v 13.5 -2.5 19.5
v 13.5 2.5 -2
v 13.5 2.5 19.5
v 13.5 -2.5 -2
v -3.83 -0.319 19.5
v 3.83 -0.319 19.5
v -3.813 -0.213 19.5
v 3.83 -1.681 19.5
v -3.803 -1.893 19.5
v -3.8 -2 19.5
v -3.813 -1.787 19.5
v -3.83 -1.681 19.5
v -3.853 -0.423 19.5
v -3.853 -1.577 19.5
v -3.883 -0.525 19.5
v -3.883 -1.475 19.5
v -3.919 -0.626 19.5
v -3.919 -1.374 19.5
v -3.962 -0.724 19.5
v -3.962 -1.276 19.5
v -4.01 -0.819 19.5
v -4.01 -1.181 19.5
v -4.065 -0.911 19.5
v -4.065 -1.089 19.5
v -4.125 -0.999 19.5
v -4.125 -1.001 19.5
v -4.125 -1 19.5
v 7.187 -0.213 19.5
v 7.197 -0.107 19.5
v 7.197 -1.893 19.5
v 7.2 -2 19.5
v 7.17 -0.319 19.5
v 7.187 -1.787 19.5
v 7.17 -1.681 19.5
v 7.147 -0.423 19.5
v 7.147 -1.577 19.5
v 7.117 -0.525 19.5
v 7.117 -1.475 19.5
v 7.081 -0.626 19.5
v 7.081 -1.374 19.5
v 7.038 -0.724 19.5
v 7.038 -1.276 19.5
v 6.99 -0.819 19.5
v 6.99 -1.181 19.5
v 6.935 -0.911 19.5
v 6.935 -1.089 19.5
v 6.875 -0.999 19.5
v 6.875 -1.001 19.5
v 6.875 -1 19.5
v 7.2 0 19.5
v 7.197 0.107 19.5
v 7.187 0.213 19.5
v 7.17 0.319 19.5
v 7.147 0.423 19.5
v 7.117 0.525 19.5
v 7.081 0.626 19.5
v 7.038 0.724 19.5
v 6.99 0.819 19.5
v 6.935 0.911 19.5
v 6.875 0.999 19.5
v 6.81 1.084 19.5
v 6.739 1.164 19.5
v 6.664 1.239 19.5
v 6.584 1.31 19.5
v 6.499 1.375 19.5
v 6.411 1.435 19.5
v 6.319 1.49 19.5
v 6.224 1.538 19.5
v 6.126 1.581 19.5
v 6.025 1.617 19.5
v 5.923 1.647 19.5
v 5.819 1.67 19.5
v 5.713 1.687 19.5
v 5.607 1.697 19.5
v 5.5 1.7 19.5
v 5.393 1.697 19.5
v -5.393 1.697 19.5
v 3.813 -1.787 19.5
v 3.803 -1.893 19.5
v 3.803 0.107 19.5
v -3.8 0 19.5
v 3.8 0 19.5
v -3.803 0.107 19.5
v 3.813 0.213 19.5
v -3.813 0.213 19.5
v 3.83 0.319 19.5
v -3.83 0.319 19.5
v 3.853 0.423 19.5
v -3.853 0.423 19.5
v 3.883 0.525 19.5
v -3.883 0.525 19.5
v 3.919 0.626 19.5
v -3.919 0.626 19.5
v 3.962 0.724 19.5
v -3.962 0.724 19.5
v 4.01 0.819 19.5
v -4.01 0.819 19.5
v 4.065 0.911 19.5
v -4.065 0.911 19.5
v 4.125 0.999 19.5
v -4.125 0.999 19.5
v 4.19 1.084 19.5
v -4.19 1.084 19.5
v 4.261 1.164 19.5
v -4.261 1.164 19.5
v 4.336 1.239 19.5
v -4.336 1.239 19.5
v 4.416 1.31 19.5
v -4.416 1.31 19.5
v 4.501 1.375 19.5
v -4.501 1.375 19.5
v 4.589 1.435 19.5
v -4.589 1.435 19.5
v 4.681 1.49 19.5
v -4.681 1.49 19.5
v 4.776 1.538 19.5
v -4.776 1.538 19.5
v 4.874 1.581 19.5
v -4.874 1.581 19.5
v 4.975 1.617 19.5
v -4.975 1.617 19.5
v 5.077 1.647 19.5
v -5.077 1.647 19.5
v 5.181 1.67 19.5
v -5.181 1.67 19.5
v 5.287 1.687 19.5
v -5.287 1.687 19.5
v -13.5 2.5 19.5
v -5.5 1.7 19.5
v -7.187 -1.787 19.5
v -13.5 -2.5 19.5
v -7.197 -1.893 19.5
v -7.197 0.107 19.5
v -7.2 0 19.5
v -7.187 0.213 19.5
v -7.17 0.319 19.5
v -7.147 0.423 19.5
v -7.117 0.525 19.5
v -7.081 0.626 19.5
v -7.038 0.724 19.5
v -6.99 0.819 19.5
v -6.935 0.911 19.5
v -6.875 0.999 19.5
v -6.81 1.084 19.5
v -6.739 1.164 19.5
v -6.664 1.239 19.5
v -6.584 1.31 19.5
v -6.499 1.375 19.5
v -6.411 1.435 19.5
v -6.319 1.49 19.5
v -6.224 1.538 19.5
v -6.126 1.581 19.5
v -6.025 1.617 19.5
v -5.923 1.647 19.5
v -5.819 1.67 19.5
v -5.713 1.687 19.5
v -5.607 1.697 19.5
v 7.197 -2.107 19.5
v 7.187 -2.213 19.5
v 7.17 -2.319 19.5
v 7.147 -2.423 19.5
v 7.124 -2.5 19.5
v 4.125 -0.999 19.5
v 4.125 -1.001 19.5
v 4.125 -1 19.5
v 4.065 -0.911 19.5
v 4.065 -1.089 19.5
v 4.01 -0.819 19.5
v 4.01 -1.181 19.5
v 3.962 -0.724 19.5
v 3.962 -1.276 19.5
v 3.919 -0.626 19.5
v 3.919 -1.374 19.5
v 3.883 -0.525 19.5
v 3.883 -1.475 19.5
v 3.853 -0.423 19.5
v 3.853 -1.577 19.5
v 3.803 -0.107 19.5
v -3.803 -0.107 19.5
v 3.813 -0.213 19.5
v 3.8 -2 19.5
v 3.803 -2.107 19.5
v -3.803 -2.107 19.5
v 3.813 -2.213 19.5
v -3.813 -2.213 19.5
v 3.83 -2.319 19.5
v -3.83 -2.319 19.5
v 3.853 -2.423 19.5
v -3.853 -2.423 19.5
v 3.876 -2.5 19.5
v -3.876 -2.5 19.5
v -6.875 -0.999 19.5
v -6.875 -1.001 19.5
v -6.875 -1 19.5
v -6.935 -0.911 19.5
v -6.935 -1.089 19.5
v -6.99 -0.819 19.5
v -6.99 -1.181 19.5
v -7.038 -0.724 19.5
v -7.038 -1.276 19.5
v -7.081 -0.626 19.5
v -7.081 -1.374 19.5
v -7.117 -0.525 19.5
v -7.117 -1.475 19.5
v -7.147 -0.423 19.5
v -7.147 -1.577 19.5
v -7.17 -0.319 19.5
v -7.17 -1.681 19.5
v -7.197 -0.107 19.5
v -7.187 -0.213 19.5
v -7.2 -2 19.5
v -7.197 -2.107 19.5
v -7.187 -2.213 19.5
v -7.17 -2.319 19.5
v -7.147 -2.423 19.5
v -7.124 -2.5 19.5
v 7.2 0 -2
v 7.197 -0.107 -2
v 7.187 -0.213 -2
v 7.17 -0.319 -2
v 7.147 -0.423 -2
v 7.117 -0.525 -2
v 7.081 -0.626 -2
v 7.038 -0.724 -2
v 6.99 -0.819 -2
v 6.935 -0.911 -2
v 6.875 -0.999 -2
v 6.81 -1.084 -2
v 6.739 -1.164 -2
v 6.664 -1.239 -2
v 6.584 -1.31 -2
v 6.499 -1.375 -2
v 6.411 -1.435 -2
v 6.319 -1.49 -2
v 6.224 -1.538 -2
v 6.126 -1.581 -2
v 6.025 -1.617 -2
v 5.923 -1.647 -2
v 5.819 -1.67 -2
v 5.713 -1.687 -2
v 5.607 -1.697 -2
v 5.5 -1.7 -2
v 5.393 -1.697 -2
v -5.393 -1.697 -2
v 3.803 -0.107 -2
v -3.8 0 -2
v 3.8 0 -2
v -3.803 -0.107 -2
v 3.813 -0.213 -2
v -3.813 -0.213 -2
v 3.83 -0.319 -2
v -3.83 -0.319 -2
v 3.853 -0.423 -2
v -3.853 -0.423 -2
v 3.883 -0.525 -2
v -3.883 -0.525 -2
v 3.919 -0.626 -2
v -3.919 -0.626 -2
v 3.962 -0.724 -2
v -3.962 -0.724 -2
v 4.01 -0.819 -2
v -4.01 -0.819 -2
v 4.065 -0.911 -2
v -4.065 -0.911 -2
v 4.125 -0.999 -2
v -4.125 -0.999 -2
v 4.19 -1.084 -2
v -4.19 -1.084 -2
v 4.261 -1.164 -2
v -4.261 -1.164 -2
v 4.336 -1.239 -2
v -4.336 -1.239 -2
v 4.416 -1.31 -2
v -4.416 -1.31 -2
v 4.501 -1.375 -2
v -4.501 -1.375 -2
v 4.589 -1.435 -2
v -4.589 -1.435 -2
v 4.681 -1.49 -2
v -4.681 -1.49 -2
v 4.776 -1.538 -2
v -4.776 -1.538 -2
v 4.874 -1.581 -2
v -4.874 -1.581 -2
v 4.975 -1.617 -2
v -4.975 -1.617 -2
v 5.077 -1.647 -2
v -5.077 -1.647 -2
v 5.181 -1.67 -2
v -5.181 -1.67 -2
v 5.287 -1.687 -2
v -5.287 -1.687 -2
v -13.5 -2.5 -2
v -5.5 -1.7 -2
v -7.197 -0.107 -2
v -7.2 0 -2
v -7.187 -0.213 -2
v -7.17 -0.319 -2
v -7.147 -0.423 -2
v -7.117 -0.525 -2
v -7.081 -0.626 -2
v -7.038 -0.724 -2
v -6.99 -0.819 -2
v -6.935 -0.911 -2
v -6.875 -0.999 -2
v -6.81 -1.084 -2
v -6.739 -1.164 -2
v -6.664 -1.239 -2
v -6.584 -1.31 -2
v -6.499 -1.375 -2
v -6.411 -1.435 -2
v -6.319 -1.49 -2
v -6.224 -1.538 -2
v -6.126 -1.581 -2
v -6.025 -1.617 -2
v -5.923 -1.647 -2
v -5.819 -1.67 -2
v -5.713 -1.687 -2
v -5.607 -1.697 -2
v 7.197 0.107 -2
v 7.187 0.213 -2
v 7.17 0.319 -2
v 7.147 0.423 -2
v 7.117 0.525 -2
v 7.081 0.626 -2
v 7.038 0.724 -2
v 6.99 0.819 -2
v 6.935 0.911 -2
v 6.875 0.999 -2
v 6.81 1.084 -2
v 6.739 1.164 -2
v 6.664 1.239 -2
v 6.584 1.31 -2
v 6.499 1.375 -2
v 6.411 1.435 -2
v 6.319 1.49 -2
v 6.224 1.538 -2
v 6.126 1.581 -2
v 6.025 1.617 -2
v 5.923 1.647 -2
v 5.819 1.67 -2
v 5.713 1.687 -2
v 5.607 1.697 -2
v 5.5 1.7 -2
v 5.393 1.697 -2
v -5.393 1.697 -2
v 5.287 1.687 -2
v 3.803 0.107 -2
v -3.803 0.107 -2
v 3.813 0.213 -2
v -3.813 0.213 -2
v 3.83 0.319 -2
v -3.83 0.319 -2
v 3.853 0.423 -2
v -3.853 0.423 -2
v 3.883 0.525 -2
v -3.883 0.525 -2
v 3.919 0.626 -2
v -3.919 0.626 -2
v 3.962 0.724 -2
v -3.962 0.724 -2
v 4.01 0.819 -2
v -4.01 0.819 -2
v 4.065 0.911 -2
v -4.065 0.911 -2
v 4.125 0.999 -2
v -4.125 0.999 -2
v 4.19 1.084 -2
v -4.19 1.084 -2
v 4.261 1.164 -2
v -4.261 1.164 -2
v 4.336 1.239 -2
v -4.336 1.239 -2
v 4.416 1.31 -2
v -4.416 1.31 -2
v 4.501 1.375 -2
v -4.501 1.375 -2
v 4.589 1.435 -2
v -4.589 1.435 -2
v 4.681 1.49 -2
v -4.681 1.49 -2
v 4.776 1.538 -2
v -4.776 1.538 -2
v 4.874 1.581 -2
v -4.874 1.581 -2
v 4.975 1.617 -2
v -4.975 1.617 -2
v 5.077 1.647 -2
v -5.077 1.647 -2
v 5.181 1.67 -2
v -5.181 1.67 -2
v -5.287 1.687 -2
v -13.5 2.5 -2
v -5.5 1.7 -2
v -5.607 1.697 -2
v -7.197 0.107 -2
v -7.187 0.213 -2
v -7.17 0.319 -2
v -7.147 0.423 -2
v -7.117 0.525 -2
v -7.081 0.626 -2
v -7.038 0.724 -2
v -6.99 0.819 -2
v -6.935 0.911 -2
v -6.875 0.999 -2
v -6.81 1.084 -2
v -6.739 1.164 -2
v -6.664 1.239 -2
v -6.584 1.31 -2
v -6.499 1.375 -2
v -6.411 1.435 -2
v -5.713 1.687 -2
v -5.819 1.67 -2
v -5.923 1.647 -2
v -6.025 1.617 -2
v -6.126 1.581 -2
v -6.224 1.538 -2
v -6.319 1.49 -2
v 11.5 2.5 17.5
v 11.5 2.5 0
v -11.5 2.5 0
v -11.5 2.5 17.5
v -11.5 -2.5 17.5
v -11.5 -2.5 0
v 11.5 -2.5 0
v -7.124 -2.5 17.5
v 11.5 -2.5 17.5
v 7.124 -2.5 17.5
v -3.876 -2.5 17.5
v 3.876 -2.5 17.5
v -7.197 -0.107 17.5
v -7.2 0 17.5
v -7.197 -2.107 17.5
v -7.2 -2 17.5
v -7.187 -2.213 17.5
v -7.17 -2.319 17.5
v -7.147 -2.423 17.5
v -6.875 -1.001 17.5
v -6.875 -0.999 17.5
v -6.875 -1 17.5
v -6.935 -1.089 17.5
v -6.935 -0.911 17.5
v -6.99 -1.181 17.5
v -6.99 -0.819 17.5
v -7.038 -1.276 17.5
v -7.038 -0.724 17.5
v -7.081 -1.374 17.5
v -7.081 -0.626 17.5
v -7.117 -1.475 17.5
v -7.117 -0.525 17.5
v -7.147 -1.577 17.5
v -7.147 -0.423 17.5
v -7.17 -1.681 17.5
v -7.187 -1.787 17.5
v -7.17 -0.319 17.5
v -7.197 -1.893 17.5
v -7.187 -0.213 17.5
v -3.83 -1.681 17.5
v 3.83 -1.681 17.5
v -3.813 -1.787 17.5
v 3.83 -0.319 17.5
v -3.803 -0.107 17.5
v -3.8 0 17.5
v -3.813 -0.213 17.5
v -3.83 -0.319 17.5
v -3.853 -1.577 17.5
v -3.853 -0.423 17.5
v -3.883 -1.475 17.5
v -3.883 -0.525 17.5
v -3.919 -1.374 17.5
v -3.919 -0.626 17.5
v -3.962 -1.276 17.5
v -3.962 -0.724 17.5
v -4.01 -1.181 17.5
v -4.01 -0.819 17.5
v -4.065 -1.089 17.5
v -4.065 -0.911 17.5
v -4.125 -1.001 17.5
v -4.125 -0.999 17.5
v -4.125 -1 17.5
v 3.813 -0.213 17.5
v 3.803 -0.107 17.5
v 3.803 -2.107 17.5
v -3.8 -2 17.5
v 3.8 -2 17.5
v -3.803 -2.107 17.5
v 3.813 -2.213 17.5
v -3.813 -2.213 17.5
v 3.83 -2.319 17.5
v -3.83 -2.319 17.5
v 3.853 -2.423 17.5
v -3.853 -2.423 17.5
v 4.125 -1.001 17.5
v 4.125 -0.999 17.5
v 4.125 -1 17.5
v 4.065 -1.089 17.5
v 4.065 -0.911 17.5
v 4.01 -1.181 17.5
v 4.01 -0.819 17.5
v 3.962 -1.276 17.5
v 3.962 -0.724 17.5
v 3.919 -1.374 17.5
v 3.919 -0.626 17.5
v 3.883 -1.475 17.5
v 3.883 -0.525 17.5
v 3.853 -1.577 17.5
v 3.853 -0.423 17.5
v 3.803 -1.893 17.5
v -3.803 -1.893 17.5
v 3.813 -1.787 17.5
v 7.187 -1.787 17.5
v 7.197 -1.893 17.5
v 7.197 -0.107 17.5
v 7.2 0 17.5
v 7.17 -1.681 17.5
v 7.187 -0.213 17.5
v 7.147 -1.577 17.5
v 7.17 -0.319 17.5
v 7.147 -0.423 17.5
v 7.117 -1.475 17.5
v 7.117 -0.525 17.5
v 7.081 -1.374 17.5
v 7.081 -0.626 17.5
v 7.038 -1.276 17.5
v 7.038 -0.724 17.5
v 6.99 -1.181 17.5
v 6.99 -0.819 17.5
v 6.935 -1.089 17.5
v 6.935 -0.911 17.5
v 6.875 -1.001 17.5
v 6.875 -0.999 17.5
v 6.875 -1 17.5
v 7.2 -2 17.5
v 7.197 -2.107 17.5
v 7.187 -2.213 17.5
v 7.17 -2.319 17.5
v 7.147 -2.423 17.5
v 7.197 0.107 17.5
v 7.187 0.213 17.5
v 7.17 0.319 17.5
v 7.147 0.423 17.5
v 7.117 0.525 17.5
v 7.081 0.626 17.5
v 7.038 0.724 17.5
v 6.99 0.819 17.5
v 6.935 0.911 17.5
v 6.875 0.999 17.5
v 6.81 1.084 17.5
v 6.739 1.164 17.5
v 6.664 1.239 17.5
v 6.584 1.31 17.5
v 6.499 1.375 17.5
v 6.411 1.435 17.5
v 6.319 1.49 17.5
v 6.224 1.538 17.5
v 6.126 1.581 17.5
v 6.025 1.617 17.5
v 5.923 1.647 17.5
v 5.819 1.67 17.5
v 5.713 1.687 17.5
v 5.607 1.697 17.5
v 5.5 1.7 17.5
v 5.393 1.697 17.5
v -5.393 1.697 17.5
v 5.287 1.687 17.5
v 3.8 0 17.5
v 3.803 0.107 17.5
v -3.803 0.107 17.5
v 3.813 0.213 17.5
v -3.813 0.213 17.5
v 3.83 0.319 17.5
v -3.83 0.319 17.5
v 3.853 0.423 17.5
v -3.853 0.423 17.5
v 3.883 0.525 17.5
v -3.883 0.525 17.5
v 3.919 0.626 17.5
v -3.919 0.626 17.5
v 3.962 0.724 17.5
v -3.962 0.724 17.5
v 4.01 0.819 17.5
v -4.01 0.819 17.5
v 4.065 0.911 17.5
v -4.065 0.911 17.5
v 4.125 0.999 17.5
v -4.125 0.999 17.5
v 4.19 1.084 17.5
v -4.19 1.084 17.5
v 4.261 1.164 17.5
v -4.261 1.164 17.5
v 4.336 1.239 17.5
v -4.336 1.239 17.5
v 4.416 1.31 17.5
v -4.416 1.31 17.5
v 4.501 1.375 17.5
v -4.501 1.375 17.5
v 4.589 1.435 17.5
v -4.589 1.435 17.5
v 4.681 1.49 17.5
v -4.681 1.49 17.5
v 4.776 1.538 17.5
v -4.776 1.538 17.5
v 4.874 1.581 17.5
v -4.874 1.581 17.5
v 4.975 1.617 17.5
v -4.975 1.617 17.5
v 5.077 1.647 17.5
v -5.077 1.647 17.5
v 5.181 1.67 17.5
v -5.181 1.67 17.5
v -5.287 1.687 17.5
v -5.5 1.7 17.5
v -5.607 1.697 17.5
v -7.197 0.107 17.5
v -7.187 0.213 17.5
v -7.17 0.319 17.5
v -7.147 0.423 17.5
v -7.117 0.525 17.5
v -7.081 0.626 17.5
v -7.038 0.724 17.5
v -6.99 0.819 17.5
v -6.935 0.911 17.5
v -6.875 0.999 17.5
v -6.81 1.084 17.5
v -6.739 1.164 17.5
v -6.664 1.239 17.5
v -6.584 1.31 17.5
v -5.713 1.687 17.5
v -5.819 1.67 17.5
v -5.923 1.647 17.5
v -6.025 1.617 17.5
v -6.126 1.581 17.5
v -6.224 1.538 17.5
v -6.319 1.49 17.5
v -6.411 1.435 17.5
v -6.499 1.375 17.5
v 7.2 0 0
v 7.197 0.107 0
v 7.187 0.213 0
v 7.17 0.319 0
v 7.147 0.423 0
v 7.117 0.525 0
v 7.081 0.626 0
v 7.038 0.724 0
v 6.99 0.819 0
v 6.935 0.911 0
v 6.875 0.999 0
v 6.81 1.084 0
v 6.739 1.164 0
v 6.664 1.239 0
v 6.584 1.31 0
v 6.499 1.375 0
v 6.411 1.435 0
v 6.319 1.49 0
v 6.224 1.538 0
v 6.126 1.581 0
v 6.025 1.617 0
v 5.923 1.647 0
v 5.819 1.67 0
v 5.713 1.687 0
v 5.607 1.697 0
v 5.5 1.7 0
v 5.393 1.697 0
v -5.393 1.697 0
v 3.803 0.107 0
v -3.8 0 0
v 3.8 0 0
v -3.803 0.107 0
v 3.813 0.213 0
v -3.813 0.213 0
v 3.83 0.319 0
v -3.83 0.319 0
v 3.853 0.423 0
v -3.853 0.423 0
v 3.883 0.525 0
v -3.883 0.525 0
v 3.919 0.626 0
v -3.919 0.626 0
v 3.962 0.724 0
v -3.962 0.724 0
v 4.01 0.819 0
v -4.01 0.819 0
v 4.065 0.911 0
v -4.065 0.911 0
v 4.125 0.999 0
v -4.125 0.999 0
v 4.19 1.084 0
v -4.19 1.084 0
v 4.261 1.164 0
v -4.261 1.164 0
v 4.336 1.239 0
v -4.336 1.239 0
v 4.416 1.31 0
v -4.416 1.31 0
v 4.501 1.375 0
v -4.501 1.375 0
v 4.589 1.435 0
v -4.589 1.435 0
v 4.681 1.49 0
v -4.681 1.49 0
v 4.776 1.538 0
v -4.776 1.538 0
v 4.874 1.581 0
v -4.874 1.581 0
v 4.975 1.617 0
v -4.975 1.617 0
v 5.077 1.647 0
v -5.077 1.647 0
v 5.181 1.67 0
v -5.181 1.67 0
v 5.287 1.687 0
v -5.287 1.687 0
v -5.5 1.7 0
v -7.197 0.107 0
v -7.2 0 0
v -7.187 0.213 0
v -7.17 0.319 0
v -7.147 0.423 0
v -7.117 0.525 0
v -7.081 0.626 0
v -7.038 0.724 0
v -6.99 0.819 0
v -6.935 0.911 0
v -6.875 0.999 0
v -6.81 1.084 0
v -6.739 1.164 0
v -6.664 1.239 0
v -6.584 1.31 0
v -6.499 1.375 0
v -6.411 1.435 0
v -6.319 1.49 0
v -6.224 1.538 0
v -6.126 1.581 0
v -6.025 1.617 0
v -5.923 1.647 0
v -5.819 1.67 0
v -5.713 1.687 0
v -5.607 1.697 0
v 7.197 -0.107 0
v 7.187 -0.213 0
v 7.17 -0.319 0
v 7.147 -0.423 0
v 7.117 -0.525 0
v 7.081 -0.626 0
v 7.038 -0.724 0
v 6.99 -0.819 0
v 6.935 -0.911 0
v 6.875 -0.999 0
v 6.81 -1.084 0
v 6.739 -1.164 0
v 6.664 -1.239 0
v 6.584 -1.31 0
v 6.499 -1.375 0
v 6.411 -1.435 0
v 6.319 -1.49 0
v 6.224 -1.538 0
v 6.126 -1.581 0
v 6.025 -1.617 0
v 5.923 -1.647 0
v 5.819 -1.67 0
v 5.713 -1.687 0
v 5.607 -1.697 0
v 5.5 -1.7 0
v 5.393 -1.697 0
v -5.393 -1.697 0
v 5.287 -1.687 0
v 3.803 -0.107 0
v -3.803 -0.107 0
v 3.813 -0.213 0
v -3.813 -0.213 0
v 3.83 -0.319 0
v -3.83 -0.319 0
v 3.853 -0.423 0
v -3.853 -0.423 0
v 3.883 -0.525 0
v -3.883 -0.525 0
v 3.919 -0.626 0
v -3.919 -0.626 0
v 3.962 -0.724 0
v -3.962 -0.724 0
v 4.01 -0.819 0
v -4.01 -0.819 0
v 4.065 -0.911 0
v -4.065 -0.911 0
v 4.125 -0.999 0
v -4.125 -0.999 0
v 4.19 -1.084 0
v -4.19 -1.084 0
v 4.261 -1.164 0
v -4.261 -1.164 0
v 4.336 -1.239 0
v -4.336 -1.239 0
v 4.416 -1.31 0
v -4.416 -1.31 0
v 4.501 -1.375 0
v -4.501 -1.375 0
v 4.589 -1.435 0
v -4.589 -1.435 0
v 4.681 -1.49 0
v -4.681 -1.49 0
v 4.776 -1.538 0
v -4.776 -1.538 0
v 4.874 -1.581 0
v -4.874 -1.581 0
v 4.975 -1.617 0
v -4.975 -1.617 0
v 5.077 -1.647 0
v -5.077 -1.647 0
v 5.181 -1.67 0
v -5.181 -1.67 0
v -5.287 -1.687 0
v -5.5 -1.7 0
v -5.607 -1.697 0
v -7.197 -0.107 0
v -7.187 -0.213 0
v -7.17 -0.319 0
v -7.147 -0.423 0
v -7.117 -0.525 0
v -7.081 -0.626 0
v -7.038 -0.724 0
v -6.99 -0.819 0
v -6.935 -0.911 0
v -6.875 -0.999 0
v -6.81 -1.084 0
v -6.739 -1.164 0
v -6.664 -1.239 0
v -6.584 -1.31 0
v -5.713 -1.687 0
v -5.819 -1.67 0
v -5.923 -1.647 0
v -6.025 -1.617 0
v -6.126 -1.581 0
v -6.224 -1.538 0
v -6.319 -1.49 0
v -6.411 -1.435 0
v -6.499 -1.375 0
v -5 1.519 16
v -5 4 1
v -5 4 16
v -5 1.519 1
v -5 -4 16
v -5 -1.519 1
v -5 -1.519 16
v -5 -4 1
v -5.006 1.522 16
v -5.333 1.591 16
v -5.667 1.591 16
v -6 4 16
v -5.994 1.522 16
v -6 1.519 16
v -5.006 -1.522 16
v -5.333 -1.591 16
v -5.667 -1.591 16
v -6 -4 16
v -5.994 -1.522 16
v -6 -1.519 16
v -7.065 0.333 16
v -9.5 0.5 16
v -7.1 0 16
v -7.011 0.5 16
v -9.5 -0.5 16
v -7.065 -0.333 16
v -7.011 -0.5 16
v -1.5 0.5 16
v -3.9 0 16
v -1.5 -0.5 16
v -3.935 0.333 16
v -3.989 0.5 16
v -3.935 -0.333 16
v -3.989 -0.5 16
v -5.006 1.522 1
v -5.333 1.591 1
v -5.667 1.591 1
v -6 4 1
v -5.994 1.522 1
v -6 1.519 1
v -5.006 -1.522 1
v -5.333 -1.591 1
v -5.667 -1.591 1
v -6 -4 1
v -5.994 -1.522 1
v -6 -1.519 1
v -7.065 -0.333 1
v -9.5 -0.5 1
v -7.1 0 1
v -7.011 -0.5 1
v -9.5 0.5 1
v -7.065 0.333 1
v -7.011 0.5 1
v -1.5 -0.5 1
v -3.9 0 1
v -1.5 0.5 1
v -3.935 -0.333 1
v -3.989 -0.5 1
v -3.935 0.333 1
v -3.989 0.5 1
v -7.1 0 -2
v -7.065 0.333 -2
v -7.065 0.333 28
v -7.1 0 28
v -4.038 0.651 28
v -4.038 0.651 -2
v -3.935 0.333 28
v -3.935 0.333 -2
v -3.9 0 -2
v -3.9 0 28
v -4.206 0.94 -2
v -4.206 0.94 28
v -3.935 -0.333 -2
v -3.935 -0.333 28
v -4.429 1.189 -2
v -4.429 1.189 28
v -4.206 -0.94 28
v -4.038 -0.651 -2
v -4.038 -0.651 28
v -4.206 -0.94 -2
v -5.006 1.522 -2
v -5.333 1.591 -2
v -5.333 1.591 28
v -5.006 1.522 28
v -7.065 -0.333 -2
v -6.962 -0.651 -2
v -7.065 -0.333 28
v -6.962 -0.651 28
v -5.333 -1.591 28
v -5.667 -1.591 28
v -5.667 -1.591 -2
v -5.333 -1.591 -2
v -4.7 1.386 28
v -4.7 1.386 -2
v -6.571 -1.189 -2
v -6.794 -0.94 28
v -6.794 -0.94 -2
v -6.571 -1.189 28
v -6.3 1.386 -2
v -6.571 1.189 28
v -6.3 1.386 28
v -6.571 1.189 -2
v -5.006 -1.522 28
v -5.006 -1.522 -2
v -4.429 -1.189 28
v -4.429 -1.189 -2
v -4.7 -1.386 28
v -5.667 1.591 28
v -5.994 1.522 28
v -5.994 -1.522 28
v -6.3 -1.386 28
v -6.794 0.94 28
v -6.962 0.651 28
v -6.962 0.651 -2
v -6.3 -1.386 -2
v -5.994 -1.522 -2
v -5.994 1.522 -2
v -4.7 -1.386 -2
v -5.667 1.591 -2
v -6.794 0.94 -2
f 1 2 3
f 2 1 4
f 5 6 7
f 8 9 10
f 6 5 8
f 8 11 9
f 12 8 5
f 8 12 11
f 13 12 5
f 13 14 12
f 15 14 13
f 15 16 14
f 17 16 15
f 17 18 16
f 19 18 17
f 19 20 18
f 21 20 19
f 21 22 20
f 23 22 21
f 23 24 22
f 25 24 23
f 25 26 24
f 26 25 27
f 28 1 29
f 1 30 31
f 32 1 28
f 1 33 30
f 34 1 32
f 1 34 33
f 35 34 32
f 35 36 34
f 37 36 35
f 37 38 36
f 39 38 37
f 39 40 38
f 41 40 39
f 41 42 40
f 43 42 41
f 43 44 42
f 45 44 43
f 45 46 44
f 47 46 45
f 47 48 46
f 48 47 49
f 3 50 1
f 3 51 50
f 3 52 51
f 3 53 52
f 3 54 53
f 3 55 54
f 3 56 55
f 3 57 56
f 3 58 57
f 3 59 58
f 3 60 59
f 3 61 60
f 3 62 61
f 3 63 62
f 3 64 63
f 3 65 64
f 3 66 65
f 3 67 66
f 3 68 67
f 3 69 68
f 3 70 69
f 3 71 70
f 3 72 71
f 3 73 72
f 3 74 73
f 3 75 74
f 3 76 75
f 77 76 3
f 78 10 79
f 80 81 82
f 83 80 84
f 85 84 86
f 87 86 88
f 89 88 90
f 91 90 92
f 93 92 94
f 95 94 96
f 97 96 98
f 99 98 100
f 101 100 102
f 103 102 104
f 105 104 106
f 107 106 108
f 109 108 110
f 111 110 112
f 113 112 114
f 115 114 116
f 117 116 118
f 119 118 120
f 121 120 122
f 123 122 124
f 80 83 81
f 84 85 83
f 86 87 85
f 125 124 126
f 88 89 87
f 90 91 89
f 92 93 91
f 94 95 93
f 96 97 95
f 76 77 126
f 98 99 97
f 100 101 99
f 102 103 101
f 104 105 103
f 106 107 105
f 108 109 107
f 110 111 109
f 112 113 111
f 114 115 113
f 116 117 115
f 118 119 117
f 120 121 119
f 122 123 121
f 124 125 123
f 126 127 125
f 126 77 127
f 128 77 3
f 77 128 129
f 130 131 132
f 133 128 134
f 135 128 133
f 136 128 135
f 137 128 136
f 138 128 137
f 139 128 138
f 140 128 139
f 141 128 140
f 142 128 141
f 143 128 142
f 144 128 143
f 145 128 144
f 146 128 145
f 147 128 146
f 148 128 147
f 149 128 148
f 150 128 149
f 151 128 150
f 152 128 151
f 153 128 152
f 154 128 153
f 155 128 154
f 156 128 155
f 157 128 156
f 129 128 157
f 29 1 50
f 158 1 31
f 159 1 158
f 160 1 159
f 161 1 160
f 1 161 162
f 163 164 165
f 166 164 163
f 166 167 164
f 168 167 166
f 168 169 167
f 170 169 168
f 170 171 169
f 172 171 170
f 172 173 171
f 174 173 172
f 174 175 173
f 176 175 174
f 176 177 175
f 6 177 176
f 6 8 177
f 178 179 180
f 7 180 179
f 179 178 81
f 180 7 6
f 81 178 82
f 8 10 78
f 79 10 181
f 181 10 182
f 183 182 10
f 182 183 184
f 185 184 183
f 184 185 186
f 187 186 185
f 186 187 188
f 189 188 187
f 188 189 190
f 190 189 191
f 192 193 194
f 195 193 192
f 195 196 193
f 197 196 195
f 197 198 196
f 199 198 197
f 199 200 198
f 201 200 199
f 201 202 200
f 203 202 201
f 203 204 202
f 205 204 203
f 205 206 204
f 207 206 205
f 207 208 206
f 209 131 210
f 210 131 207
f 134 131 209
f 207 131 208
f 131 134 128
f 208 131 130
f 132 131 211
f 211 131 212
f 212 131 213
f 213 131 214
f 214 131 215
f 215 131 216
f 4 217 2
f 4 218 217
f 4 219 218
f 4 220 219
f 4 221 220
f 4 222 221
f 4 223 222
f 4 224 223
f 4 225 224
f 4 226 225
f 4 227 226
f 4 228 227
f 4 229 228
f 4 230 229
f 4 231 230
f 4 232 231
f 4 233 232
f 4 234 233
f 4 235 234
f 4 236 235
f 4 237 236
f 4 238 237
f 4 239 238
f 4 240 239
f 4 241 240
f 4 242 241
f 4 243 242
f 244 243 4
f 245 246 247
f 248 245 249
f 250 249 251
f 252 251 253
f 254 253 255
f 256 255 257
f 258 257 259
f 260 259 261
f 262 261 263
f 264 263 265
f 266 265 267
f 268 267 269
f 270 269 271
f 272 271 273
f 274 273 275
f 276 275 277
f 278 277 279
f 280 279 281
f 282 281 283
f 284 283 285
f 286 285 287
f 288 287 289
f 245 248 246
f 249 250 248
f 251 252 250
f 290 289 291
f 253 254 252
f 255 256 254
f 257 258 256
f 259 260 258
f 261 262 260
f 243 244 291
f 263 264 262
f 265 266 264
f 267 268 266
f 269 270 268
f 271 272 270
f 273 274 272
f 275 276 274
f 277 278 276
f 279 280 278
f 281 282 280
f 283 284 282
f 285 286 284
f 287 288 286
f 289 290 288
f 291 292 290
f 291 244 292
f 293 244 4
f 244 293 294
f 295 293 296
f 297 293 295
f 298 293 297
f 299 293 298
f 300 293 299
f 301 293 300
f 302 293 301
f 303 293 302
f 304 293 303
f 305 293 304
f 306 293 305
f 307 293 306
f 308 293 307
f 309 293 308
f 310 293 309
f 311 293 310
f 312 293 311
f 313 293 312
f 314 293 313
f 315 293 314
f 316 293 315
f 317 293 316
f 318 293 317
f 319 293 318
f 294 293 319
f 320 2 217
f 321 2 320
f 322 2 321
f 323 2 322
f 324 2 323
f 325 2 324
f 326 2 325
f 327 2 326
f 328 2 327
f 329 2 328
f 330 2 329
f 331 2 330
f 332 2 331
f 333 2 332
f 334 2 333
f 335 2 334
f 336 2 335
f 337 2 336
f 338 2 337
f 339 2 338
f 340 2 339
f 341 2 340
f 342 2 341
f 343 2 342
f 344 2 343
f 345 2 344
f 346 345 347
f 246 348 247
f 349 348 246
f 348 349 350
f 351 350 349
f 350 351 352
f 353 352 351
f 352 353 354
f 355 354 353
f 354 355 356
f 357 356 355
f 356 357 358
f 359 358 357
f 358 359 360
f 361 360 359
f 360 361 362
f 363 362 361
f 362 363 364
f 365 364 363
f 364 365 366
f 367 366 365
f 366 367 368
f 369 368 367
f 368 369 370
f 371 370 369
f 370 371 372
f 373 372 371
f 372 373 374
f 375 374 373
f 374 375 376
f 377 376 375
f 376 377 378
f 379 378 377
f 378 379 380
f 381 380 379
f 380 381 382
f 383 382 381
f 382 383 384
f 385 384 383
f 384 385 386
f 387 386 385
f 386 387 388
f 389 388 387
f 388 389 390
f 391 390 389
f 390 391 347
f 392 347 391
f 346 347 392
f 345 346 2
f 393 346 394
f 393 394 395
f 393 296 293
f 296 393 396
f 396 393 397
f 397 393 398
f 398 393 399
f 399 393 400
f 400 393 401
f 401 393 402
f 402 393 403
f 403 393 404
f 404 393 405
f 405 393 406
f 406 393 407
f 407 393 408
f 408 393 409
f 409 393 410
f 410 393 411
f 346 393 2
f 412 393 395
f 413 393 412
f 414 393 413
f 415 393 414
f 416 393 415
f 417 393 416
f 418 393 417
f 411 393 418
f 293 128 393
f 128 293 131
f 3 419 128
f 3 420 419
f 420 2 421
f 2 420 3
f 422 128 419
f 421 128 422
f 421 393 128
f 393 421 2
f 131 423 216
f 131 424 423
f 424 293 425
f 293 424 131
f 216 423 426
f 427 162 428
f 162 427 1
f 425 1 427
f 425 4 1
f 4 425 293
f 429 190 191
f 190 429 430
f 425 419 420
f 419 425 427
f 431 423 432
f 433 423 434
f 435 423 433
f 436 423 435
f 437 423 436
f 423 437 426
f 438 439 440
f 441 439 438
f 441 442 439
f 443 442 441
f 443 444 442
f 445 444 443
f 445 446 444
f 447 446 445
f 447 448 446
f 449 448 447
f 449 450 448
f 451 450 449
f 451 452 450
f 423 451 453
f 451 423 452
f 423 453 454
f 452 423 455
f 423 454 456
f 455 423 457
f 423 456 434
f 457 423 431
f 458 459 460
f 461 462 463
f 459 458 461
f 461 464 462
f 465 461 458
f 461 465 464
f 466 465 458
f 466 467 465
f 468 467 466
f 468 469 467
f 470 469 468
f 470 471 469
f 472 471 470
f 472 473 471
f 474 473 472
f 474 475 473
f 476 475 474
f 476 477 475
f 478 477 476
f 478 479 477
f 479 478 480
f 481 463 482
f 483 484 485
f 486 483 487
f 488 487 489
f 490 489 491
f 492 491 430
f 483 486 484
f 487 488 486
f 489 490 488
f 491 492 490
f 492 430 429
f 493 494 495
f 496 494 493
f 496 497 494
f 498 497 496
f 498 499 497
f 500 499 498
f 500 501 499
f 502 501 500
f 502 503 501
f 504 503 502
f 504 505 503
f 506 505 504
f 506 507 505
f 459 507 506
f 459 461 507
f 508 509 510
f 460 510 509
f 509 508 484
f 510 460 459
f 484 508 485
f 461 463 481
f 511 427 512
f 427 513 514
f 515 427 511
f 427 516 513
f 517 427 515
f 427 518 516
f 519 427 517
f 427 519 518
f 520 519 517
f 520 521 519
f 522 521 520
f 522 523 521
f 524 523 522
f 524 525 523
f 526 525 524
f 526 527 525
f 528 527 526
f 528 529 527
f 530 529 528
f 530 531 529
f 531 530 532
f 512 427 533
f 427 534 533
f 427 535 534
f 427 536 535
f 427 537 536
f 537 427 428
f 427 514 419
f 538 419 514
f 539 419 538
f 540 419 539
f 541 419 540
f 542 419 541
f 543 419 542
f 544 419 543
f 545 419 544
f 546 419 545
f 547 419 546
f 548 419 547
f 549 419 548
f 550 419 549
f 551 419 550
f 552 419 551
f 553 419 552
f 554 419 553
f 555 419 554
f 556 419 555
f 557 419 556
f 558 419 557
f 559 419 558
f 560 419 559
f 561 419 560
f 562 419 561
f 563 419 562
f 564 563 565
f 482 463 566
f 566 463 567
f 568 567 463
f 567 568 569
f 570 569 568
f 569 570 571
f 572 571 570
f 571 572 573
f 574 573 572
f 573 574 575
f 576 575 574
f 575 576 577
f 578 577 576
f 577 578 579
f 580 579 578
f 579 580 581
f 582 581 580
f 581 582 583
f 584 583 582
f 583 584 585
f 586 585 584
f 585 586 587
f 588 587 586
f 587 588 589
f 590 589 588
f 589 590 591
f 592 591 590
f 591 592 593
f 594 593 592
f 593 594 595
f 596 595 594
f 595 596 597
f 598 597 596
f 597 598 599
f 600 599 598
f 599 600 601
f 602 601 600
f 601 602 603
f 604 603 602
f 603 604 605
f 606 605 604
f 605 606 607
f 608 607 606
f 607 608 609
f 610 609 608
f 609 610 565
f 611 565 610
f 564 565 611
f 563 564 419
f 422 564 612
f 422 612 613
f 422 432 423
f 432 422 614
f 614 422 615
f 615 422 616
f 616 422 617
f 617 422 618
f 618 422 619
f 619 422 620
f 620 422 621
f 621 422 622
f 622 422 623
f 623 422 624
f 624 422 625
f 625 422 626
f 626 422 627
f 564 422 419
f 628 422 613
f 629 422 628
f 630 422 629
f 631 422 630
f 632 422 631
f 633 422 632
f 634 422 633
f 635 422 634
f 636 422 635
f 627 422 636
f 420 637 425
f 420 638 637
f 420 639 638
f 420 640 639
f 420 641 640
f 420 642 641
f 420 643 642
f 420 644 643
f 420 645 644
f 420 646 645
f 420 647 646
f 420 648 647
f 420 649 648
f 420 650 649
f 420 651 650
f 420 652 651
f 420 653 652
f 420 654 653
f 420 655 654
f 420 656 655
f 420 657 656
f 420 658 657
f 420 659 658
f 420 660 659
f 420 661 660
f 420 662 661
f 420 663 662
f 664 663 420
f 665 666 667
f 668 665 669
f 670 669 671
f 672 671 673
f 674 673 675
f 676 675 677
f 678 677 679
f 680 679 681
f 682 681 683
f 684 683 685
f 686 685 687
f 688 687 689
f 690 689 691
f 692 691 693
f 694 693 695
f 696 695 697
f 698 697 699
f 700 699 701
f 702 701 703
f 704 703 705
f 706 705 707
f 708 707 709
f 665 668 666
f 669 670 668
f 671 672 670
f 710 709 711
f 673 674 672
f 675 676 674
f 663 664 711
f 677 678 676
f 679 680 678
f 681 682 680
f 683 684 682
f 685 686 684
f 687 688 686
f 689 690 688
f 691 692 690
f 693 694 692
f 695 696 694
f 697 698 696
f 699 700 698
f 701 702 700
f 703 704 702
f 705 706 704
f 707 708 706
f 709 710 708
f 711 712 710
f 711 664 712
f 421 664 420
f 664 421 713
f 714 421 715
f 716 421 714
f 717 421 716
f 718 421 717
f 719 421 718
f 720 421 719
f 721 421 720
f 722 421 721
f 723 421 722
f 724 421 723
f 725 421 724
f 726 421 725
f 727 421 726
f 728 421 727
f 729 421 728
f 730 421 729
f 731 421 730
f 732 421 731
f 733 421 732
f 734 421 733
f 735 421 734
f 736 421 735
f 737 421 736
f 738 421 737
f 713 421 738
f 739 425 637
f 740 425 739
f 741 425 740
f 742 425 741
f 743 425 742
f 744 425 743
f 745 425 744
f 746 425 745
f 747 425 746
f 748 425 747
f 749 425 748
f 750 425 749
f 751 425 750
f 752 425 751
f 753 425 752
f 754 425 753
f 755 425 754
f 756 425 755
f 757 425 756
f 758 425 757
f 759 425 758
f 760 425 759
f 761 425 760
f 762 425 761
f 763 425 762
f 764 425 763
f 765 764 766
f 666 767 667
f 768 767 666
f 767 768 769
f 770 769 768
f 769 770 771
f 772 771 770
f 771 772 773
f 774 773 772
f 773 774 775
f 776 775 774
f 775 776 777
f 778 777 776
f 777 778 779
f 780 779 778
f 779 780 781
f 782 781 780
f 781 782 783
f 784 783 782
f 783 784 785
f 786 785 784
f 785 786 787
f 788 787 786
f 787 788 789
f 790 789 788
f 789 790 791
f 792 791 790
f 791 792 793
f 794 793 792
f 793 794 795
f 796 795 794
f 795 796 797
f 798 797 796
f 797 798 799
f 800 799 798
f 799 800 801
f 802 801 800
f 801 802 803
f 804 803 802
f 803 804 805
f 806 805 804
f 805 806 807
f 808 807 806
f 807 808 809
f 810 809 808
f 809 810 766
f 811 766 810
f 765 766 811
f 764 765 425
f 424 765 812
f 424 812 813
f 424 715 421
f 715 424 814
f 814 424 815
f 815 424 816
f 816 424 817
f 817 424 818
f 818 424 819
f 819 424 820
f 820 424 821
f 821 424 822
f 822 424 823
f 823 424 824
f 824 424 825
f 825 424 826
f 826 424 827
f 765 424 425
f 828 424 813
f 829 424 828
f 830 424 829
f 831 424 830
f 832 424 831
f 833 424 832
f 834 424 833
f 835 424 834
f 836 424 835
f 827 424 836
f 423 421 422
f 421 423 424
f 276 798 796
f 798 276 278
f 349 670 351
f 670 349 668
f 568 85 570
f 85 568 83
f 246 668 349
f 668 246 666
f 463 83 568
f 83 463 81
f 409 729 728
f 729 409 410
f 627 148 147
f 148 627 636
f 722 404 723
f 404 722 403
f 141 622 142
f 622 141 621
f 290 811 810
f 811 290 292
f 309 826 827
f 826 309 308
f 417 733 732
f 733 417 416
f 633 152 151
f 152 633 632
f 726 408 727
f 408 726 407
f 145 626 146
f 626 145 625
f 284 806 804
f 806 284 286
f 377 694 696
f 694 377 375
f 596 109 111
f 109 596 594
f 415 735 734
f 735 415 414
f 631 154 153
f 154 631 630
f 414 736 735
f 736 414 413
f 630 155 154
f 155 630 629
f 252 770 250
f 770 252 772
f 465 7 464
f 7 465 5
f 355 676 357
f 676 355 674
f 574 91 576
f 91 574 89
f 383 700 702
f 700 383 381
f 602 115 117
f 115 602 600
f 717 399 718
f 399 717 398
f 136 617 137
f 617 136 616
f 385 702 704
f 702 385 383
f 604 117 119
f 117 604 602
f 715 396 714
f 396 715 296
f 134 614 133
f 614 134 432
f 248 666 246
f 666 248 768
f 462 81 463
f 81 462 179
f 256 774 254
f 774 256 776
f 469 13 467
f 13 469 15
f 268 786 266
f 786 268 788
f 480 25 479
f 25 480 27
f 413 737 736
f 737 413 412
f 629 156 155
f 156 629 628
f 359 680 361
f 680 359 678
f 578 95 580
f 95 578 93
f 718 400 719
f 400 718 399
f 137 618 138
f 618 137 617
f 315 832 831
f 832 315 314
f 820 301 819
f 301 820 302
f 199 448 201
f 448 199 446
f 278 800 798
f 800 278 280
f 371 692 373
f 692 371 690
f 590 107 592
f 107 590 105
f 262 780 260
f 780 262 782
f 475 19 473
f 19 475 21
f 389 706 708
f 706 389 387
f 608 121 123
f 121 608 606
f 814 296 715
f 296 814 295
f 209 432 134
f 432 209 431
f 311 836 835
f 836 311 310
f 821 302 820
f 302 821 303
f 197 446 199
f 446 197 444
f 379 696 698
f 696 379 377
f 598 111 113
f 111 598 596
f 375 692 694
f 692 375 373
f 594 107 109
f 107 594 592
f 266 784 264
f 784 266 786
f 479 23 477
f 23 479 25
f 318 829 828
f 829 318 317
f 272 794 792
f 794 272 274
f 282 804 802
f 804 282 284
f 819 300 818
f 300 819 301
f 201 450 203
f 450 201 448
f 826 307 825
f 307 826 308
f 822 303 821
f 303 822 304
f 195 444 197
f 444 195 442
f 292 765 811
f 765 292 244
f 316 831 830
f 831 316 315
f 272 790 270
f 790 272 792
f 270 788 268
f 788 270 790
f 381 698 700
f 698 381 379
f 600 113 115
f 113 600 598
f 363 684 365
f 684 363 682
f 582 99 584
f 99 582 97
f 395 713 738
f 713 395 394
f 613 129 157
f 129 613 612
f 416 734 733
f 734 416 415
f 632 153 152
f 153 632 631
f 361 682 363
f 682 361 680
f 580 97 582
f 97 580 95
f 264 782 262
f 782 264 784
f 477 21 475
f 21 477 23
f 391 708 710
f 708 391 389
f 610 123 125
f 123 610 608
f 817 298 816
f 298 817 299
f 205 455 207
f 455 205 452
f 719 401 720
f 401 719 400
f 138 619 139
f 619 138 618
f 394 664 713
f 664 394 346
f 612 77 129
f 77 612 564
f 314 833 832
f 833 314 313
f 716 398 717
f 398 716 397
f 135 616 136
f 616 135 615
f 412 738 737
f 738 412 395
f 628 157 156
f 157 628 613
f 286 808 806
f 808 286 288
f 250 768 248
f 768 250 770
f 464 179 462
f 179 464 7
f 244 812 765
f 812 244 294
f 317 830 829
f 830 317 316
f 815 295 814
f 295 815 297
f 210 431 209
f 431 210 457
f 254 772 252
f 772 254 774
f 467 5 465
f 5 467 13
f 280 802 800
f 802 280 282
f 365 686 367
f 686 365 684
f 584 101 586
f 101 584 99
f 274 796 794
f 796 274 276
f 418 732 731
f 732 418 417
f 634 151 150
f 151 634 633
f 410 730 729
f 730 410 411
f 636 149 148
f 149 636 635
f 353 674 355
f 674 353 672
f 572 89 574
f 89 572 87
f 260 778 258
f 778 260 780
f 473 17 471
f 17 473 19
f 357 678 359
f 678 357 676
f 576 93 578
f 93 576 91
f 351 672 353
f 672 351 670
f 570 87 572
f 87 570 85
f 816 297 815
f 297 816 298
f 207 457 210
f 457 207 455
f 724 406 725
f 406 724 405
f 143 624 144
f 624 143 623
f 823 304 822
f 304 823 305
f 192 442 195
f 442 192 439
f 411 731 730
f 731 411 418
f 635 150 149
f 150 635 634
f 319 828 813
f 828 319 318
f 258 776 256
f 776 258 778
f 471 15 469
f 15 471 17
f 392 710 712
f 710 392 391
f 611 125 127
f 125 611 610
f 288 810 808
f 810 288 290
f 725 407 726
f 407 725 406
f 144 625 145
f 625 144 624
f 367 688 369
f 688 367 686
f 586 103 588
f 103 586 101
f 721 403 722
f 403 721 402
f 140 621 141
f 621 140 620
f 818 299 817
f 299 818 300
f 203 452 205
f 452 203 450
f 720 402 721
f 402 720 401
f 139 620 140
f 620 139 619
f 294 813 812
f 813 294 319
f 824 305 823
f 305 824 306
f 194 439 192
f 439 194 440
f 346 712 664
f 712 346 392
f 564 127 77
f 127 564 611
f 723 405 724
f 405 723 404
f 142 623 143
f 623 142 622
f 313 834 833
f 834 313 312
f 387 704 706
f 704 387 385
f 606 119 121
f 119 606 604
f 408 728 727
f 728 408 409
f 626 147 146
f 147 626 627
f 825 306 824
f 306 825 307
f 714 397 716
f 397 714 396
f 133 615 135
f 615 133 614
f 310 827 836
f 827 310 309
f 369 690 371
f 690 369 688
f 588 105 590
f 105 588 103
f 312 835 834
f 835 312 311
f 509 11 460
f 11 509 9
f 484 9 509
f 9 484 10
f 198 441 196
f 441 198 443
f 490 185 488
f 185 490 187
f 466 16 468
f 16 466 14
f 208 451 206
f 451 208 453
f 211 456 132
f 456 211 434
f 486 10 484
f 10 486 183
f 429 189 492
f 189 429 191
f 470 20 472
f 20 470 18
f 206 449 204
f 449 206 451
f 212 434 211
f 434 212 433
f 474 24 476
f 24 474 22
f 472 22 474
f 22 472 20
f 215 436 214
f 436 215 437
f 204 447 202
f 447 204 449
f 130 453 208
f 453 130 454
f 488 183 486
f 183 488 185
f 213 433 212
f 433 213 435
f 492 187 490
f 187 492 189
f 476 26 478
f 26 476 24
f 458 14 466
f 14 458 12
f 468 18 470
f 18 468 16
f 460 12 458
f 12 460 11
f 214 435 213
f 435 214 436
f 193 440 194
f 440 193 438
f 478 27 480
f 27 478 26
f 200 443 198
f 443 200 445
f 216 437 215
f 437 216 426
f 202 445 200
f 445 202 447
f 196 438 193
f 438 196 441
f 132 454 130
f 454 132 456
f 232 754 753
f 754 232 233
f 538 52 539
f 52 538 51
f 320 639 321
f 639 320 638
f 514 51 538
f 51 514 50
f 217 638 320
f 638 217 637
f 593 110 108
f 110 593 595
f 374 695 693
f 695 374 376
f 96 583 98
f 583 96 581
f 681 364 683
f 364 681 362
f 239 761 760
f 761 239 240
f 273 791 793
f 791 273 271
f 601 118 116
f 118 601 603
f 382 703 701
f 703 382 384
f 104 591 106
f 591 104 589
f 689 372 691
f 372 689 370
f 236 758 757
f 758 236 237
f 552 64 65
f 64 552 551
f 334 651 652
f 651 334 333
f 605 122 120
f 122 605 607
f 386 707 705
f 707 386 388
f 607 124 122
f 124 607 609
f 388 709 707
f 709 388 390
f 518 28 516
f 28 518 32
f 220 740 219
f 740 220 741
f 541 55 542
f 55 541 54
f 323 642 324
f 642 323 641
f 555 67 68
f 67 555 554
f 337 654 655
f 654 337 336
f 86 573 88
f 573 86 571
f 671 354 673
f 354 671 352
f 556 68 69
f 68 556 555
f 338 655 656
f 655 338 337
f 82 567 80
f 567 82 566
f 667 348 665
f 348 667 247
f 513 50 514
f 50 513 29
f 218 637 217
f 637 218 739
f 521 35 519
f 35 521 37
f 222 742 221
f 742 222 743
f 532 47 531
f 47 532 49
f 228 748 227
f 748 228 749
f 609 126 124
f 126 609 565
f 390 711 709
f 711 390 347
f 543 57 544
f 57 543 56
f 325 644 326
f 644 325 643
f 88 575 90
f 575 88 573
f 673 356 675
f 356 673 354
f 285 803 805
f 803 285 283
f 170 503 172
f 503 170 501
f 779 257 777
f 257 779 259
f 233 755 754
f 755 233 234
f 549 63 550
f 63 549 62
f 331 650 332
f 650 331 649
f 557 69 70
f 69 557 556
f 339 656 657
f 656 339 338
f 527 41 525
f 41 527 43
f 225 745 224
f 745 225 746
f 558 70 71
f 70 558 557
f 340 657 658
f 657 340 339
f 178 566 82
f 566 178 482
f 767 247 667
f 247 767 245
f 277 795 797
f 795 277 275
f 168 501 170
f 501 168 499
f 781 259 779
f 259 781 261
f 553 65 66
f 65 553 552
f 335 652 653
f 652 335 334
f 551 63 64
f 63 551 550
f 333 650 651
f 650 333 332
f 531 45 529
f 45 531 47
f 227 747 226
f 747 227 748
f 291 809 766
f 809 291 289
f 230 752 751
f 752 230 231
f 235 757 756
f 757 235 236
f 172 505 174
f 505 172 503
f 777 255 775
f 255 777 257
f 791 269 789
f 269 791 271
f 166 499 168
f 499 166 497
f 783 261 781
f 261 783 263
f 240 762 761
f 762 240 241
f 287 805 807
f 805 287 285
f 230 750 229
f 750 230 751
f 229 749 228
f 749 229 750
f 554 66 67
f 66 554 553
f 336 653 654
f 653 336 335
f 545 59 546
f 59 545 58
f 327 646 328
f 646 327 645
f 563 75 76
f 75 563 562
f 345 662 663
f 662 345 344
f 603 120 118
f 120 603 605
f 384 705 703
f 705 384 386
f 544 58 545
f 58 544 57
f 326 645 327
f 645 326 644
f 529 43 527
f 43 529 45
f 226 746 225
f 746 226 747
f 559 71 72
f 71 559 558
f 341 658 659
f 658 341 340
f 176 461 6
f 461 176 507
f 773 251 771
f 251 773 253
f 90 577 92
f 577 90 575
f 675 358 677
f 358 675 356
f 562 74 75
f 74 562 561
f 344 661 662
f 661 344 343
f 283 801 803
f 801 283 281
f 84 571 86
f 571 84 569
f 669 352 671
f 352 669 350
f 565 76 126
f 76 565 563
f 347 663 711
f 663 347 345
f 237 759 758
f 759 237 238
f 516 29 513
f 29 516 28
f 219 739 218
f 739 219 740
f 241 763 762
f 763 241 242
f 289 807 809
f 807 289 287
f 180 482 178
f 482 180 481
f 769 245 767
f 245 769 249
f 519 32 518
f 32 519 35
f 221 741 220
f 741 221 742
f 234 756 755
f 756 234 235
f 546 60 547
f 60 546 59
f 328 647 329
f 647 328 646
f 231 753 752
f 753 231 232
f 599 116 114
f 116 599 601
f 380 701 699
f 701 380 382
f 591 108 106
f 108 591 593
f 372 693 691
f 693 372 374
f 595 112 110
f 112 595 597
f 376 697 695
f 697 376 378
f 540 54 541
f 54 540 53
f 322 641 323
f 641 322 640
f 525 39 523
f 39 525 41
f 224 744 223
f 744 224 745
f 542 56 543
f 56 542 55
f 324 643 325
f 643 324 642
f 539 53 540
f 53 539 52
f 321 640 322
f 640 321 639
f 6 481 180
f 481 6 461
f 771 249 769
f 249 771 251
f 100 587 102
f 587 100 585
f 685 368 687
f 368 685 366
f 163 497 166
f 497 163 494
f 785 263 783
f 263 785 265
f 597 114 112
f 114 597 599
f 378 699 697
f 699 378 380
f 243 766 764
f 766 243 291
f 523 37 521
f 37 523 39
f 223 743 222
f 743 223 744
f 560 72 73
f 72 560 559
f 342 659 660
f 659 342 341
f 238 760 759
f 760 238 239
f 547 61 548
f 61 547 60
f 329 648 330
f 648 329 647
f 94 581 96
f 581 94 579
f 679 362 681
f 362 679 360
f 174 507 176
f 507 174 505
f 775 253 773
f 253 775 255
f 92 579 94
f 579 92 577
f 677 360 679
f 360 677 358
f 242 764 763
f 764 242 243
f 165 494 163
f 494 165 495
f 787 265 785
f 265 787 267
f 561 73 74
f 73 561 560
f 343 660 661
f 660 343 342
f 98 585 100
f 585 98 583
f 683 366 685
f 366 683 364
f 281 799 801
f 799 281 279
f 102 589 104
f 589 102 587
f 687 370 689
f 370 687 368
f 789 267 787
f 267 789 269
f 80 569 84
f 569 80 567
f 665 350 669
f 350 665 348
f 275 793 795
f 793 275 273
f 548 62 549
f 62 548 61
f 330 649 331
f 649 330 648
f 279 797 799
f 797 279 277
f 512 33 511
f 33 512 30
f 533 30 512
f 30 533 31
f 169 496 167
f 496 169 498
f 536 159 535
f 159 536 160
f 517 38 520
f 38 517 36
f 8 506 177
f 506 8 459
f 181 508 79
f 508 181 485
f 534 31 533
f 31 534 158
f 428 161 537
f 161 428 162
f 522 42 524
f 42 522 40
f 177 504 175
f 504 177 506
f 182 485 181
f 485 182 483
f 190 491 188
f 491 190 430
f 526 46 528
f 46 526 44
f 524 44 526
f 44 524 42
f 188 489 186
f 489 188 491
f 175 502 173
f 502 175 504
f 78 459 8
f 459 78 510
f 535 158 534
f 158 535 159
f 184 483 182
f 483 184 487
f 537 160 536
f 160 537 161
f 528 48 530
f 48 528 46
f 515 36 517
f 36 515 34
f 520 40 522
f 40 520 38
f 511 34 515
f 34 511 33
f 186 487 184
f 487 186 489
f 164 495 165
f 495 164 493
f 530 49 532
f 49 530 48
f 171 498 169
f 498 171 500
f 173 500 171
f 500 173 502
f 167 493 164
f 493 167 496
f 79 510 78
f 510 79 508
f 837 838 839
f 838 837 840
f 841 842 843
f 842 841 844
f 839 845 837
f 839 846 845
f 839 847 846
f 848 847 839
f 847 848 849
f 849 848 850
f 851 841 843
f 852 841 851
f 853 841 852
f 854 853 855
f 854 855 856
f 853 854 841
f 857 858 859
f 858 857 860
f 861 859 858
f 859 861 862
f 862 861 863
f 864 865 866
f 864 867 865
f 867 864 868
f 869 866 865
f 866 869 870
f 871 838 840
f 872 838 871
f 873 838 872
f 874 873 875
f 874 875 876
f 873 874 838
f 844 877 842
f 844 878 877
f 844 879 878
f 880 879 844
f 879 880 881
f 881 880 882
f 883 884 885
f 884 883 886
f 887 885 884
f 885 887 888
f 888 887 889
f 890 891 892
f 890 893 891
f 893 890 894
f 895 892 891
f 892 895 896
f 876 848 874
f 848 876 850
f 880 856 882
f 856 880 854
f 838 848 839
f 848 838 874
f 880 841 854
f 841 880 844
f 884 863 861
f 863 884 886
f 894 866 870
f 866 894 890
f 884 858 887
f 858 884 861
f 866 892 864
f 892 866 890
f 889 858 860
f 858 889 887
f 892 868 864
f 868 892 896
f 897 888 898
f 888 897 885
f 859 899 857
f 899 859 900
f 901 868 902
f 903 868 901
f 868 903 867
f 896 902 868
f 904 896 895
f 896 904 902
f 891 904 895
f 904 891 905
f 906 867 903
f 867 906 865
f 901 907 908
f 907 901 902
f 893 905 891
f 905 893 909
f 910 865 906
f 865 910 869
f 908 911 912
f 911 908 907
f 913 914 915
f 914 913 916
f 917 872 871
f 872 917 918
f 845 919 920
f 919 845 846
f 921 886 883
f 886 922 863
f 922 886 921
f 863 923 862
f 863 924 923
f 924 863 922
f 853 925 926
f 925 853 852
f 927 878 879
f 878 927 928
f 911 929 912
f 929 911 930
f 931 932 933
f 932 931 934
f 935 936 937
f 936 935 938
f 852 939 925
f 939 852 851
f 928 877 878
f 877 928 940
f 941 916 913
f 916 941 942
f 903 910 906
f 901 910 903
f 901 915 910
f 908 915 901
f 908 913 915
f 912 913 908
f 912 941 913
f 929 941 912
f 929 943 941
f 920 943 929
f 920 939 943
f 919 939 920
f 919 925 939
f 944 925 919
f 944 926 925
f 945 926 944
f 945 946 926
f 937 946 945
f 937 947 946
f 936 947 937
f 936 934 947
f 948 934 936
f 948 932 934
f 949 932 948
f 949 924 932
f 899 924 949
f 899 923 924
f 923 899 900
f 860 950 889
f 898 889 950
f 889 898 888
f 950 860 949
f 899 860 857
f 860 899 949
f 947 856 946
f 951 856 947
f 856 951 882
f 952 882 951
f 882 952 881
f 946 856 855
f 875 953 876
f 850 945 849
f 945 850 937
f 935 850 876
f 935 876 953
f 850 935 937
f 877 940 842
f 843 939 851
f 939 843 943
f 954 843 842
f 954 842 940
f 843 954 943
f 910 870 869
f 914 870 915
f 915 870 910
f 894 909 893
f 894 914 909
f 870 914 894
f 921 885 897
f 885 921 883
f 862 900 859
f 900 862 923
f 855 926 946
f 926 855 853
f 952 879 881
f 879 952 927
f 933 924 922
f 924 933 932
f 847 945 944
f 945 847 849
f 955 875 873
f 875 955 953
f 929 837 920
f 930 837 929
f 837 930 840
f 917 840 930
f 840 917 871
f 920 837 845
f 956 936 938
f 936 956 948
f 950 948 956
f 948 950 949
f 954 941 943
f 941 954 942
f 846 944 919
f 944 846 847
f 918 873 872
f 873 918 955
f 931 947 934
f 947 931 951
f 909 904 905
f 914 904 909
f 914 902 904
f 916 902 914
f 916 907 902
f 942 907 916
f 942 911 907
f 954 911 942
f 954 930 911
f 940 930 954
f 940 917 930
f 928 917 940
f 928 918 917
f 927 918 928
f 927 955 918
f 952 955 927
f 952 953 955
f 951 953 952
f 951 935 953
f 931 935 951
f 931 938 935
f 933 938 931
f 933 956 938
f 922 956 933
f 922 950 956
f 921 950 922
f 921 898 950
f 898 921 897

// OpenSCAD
r = 5.5;
d = 5;
t = 2;
c = 0.5;
w = r*4 + t*2 + c*2;
s = 0.5;
b = 13;
g = 4;
h = t + g + b + s + t;
a = 1.7;

module roller() {
	union() {
		translate([-0.5,-4,0])	
		cube([1,8,15]);
	
		translate([4,-0.5,0])	
		rotate(90,[0,0,1])
		cube([1,8,15]);
	
		translate([0,0,-3])	 cylinder( r=a-0.1, h=30, $fn=30 );
	}
}

union() {
	translate([-w/2,-d/2,-2]) {
		difference() {
			translate([0,0,0]) cube([w,d,h]);
			translate([t,-d/2,t]) cube([4*r+2*c, d+3, g+b+s]);
			translate([w/2-r,d/2,-1]) cylinder(r=a,h=h+2,$fn=100);
			translate([w/2-r,d/2-2.0,t]) cylinder(r=a,h=h+2,$fn=100);
			translate([w/2+r,d/2,-1]) cylinder(r=a,h=h+2,$fn=100);
			translate([w/2+r,d/2-2.0,t]) cylinder(r=a,h=h+2,$fn=100);

		}
	}
}

translate([-r,0,1]) roller();
//translate([+r,0,1]) roller();
